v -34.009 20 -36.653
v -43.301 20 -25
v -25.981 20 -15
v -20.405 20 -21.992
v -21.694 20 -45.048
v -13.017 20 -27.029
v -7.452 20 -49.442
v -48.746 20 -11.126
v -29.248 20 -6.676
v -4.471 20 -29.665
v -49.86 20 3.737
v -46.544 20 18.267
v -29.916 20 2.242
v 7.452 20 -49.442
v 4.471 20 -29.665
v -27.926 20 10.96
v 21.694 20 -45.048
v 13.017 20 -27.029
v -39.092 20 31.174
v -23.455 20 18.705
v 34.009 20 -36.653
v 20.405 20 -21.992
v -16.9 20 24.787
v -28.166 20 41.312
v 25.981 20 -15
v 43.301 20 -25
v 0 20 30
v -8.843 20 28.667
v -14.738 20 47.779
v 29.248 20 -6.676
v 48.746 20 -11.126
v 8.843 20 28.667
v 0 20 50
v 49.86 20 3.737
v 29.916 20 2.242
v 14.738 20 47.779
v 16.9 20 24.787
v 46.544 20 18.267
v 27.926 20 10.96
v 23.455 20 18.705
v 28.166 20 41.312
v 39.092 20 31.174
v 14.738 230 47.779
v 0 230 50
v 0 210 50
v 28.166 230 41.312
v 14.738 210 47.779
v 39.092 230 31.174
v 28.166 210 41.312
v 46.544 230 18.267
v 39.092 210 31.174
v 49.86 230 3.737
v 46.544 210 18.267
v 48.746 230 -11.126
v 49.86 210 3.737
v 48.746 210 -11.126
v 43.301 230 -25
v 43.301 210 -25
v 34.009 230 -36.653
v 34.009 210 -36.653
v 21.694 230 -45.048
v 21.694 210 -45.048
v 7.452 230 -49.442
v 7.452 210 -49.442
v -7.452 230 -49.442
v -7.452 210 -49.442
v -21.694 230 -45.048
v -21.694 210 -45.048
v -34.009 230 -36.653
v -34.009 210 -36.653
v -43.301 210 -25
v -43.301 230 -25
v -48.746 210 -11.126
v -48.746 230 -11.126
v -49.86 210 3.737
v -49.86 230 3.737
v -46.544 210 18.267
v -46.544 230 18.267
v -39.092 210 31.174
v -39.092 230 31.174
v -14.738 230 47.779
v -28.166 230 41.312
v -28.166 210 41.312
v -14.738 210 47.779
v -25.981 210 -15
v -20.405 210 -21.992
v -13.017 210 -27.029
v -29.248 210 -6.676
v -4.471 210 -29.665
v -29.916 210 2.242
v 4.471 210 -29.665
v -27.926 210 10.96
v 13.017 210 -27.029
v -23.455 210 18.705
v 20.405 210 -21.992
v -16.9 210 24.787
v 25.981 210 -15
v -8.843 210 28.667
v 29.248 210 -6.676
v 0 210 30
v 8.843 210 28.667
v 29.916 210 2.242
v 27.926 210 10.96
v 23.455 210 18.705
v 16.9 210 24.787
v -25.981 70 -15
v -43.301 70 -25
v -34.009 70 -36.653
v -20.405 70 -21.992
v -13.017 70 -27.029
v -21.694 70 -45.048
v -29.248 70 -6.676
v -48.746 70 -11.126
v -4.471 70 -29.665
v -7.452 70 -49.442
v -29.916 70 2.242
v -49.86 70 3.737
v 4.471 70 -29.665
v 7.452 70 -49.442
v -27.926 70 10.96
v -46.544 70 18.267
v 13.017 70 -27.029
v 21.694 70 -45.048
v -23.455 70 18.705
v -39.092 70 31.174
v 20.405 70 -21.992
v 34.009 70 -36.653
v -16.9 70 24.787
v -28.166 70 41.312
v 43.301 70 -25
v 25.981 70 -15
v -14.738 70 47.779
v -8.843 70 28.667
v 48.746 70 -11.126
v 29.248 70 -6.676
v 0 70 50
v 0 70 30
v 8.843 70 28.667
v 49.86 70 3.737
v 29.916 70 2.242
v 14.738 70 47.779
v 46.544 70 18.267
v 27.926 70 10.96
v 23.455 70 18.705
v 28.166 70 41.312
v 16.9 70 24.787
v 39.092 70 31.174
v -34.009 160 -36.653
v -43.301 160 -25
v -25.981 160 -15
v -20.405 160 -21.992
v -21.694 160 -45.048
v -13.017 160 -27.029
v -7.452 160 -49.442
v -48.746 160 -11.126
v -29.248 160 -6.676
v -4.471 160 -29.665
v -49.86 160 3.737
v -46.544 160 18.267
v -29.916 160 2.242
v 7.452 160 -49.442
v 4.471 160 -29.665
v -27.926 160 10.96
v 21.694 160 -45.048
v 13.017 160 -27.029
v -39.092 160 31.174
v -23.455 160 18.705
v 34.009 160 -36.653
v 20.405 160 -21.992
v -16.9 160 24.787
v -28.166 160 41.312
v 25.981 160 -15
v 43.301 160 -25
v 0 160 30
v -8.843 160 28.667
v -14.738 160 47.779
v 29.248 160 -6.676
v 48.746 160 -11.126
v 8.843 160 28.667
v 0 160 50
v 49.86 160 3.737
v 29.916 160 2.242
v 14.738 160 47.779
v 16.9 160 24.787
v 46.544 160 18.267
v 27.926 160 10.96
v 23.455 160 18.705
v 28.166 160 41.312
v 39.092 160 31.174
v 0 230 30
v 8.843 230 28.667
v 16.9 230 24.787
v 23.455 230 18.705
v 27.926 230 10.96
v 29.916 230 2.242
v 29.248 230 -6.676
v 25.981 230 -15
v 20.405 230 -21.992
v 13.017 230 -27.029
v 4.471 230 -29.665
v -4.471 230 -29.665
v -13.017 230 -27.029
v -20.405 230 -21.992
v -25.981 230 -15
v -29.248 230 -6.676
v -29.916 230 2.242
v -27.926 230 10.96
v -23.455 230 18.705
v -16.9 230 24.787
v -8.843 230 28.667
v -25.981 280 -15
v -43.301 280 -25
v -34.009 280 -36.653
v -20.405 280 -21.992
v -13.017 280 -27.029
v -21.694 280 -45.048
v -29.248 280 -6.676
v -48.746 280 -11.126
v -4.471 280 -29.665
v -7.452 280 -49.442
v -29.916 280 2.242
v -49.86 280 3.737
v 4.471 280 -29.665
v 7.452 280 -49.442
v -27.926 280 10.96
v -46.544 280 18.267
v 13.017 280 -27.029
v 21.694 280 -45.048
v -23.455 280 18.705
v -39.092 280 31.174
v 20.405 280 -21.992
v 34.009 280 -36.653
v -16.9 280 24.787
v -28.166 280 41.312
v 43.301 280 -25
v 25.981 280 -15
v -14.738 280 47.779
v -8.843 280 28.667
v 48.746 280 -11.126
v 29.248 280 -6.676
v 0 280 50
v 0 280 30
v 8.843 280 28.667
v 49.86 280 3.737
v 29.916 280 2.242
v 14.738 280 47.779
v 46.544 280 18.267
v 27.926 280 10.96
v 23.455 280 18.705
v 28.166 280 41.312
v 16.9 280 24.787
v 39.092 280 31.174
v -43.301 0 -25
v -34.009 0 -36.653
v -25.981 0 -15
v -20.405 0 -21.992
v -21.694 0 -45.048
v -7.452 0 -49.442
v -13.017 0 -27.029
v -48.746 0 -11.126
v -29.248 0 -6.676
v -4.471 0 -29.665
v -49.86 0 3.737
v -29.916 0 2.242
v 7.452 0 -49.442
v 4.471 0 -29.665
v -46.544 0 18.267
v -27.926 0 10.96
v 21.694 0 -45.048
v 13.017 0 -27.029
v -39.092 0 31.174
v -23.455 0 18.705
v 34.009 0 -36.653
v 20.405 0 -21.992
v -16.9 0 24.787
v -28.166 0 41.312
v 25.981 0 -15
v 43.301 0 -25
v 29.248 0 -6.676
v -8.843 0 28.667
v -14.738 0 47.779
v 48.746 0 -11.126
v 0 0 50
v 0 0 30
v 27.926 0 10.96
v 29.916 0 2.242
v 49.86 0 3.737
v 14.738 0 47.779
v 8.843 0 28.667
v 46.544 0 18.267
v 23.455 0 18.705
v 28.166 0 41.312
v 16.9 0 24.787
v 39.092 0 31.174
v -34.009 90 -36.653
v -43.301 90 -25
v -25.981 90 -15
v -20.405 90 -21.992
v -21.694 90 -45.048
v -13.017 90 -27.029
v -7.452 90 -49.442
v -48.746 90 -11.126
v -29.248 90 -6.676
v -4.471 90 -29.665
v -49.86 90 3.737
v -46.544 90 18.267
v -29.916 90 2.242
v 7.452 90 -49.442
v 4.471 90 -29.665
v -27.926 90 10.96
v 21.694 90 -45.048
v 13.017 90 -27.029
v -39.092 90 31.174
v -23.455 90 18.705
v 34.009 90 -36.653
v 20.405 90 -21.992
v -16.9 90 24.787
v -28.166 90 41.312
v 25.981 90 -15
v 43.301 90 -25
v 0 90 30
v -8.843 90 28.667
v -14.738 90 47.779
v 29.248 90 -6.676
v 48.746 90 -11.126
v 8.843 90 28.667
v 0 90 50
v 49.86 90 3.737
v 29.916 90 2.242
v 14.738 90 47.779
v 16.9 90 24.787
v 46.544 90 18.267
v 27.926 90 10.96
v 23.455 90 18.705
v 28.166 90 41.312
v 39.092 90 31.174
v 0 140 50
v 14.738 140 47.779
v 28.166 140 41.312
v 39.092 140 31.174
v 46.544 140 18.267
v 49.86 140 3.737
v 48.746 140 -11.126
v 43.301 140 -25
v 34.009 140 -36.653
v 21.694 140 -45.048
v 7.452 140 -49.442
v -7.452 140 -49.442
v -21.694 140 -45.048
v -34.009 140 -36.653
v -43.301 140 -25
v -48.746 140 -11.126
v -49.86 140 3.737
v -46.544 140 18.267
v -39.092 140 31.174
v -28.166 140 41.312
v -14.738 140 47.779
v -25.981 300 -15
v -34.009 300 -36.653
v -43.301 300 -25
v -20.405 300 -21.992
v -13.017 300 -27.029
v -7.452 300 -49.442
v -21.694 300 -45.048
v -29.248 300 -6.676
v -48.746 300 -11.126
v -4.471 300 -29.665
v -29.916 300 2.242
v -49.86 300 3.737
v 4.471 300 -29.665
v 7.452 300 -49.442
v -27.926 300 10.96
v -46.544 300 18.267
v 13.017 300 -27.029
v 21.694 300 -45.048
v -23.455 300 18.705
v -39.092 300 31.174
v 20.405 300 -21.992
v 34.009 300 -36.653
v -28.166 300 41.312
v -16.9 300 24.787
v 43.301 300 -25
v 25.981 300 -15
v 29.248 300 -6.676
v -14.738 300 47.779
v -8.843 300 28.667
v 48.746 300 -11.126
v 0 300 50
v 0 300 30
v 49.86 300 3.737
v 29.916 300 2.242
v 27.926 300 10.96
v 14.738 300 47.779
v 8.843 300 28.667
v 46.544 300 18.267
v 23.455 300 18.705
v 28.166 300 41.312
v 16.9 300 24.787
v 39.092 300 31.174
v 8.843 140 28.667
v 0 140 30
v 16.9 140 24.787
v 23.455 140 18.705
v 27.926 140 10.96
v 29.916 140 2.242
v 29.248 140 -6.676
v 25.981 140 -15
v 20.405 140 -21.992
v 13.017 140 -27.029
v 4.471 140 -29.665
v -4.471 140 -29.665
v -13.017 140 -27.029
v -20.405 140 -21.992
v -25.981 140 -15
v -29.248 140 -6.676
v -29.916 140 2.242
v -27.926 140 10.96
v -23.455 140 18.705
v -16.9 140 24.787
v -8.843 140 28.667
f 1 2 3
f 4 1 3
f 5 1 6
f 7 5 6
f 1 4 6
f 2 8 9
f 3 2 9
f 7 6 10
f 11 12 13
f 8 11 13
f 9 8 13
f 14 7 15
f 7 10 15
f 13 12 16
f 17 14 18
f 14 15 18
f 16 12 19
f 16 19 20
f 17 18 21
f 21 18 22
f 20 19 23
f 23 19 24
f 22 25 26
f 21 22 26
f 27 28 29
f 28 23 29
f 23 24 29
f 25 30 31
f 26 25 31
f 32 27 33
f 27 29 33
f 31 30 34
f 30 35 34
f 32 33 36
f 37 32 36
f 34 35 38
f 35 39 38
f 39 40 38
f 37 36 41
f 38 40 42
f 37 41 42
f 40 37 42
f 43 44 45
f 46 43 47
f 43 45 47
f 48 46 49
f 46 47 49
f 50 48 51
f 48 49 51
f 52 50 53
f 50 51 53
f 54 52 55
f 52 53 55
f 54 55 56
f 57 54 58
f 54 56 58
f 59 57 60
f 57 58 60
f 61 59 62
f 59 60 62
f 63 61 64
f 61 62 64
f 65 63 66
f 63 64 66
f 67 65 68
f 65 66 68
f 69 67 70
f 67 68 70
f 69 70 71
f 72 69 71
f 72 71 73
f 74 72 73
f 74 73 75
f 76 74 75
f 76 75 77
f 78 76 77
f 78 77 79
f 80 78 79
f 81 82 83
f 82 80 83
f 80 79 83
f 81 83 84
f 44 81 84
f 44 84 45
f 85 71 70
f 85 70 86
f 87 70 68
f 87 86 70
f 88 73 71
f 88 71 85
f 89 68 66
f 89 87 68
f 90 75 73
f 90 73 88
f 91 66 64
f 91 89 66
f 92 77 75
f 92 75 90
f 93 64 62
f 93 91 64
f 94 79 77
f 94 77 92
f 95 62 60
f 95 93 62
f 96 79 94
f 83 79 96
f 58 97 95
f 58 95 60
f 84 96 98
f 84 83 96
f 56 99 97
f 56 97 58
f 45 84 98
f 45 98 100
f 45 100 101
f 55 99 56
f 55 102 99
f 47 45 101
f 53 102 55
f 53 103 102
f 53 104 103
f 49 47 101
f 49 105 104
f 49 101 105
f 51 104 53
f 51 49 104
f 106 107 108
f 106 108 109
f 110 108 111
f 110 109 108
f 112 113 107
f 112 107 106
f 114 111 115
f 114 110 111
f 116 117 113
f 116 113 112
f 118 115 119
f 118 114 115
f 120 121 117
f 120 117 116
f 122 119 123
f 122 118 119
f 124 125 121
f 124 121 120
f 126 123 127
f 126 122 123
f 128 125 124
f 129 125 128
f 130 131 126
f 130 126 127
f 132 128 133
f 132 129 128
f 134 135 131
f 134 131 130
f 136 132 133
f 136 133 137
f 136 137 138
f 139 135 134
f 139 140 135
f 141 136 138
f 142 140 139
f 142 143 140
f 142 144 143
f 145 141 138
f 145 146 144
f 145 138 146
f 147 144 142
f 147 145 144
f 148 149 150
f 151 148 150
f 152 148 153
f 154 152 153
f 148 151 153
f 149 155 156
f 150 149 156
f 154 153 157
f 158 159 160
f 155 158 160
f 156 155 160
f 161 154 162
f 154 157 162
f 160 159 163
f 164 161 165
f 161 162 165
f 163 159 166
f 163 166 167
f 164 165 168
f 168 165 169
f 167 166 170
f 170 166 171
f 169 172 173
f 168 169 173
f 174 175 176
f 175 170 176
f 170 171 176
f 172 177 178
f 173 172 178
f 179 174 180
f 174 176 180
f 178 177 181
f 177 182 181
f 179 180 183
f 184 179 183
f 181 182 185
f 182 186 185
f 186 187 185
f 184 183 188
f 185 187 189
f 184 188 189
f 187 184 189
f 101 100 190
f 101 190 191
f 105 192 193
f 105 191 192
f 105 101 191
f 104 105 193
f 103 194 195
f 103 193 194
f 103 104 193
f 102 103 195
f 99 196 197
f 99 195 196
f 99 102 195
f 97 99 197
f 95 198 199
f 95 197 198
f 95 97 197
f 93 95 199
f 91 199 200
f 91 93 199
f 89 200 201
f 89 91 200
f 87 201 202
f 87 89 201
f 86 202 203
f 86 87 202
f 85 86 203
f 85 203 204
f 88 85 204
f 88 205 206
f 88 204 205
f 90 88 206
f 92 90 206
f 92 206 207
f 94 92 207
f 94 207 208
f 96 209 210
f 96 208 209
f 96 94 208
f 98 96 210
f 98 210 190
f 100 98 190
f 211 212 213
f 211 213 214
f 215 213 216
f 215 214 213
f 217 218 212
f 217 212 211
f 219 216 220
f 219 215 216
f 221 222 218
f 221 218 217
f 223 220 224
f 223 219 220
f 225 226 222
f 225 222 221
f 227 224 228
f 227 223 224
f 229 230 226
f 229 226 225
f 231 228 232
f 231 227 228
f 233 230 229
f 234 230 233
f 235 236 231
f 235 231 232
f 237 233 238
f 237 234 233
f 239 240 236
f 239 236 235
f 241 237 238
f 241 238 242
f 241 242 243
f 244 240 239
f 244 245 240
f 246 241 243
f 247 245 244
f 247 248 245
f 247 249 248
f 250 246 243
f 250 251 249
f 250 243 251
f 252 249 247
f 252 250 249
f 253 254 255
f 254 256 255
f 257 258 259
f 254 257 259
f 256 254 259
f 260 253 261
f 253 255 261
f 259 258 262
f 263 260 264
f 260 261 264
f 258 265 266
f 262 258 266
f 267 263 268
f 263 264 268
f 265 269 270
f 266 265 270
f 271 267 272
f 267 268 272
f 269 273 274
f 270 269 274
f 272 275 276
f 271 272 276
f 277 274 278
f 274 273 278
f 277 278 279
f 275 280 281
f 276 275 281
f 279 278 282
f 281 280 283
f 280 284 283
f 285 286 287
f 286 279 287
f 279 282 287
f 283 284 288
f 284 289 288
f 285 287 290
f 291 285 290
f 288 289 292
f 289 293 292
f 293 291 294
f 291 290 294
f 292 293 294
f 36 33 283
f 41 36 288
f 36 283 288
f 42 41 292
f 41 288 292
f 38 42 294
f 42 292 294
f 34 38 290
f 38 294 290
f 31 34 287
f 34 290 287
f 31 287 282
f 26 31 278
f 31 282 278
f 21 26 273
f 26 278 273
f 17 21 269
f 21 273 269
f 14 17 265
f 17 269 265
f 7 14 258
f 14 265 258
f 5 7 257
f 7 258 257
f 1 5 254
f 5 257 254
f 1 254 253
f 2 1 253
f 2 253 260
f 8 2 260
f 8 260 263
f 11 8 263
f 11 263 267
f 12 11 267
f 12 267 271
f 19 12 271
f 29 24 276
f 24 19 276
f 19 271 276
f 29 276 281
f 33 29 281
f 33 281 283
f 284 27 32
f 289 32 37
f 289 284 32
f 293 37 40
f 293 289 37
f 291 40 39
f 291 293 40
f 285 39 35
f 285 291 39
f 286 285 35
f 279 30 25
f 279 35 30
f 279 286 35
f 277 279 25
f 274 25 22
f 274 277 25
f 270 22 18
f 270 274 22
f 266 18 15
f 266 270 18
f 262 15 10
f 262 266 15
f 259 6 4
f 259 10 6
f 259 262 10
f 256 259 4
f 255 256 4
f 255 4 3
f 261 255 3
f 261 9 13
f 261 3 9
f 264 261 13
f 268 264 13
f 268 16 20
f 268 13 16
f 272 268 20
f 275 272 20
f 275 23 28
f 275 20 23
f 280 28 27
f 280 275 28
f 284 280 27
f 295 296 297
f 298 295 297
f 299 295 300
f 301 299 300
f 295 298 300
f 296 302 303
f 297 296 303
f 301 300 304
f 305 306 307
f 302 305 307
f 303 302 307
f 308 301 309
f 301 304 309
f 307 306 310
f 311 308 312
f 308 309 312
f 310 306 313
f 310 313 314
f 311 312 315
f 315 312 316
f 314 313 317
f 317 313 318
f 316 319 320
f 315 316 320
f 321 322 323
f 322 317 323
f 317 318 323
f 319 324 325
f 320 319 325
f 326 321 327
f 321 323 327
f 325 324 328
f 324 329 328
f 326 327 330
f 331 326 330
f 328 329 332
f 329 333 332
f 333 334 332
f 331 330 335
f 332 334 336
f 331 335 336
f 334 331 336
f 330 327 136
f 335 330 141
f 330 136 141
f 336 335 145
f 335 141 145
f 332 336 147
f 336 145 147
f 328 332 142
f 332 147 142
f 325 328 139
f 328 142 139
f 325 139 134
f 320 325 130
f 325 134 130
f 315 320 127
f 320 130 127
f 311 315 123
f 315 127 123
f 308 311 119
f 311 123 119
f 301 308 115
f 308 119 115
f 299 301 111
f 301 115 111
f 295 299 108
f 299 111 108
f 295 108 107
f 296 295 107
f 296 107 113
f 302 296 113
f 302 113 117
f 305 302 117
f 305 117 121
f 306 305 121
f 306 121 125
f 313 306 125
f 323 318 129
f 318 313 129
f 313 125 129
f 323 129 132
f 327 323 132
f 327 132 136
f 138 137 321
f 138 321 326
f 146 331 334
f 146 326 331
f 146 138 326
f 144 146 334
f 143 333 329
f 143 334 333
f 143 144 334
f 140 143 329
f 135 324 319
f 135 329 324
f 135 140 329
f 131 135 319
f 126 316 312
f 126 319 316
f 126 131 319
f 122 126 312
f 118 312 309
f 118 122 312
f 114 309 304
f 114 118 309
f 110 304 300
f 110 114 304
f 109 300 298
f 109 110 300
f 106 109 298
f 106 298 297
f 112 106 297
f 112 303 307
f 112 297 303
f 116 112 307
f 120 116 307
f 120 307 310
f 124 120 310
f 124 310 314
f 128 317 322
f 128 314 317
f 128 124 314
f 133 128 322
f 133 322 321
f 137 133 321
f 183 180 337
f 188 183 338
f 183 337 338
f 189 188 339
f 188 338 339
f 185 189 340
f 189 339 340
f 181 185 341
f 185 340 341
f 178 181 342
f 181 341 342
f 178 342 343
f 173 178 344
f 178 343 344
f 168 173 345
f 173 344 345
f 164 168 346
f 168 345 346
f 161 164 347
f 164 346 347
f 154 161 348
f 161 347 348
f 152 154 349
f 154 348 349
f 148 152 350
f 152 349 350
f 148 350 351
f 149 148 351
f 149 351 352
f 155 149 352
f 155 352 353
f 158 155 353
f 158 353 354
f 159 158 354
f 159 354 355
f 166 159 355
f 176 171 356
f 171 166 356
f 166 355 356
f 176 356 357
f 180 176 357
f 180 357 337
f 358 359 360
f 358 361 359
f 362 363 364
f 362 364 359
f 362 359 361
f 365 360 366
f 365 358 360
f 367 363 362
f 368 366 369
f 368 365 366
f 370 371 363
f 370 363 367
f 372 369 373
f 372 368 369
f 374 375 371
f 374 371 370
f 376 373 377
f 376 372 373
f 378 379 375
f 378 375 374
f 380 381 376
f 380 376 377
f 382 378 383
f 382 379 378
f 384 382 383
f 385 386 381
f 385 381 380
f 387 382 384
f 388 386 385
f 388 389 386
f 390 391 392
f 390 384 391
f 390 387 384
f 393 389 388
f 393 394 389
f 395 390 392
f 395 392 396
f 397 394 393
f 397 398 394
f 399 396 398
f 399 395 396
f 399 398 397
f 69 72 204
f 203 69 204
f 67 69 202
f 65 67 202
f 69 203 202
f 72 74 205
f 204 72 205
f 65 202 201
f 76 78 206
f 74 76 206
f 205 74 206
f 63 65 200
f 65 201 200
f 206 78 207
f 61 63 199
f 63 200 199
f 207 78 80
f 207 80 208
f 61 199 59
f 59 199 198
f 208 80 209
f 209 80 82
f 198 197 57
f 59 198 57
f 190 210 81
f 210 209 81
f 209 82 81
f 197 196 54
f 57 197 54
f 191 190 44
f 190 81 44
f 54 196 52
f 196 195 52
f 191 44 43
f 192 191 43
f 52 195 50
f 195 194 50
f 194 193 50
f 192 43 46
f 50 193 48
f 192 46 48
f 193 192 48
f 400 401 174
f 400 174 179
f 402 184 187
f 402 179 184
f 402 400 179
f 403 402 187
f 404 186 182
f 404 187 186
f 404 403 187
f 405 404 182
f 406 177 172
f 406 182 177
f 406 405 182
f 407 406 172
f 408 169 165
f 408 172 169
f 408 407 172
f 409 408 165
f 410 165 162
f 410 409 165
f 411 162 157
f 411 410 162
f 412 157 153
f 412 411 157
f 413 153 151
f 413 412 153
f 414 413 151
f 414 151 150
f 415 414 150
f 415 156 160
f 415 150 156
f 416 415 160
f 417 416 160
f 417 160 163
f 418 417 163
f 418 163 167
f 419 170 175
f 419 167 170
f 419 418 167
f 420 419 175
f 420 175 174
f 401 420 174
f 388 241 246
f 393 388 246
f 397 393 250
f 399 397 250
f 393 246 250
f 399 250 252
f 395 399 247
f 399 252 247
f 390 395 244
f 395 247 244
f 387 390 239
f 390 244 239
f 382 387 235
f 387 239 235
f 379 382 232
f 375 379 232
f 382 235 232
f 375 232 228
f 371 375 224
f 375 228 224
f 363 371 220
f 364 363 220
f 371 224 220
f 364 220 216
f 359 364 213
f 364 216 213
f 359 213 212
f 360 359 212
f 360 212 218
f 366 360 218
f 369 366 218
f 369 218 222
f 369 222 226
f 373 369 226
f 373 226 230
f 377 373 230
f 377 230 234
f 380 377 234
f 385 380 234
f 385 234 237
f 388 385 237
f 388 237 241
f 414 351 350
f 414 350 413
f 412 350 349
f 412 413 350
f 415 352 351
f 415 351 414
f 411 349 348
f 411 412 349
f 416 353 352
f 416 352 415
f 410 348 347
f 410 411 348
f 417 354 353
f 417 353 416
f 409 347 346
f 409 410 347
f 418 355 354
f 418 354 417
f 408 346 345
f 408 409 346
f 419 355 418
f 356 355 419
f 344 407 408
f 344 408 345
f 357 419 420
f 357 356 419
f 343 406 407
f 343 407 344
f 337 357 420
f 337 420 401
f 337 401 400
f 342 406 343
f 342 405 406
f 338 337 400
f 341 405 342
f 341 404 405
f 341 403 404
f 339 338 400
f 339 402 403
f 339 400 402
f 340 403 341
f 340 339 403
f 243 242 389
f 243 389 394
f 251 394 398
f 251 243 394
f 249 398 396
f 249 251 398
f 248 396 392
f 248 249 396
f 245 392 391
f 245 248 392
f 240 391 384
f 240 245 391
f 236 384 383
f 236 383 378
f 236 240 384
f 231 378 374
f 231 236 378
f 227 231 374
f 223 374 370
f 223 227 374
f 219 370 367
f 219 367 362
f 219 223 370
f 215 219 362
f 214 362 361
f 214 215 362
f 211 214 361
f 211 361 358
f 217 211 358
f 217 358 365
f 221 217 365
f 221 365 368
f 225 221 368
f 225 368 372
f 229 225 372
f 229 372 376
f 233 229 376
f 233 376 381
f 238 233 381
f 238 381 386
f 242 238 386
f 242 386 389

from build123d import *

# Parameters (mm, degrees)
SKETCH_1_R          = 50
SKETCH_1_R_2        = 30
EXTRUDE_1_DEPTH     = 300
SKETCH_2_W          = 100
SKETCH_2_H          = 50
CUT_EXTRUDE_1_DEPTH = 300


with BuildPart() as part:
    # 草图1 → 凸台-拉伸1 (new body)
    with BuildSketch(Plane(origin=(0, 0, 0), x_dir=(1, 0, 0), z_dir=(0, 1, 0))):
        with Locations(Location((0, 0, 0), (0, 0, 270))):
            Circle(SKETCH_1_R)
        with Locations(Location((0, 0, 0), (0, 0, 270))):
            Circle(SKETCH_1_R_2, mode=Mode.SUBTRACT)
    extrude(amount=EXTRUDE_1_DEPTH)

    # 草图2 → 切除-拉伸1 (cut)
    with BuildSketch(Plane.XY.offset(50)):
        with Locations((0, 255)):
            Rectangle(SKETCH_2_W, SKETCH_2_H)
        with Locations((0, 185)):
            Rectangle(SKETCH_2_W, SKETCH_2_H)
        with Locations((0, 115)):
            Rectangle(SKETCH_2_W, SKETCH_2_H)
        with Locations((0, 45)):
            Rectangle(SKETCH_2_W, SKETCH_2_H)
    extrude(amount=-CUT_EXTRUDE_1_DEPTH, mode=Mode.SUBTRACT)


with BuildPart() as cut_extrude_1_piece_1:
    # of the separate pieces the step leaves, piece 1, a body of its own (cut_extrude_1_pieces)
    add(part.part.solids().sort_by_distance((0, 280, 50))[0])


with BuildPart() as cut_extrude_1_piece_2:
    # of the separate pieces the step leaves, piece 2, a body of its own (cut_extrude_1_pieces)
    add(part.part.solids().sort_by_distance((0, 70, 50))[0])


with BuildPart() as cut_extrude_1_piece_3:
    # of the separate pieces the step leaves, piece 3, a body of its own (cut_extrude_1_pieces)
    add(part.part.solids().sort_by_distance((0, 0, 50))[0])


with BuildPart() as cut_extrude_1_piece_4:
    # of the separate pieces the step leaves, piece 4, a body of its own (cut_extrude_1_pieces)
    add(part.part.solids().sort_by_distance((0, 140, 50))[0])


with BuildPart() as cut_extrude_1_piece_5:
    # of the separate pieces the step leaves, piece 5, a body of its own (cut_extrude_1_pieces)
    add(part.part.solids().sort_by_distance((0, 210, 50))[0])


solid = Compound([cut_extrude_1_piece_1.part, cut_extrude_1_piece_2.part, cut_extrude_1_piece_3.part, cut_extrude_1_piece_4.part, cut_extrude_1_piece_5.part])
